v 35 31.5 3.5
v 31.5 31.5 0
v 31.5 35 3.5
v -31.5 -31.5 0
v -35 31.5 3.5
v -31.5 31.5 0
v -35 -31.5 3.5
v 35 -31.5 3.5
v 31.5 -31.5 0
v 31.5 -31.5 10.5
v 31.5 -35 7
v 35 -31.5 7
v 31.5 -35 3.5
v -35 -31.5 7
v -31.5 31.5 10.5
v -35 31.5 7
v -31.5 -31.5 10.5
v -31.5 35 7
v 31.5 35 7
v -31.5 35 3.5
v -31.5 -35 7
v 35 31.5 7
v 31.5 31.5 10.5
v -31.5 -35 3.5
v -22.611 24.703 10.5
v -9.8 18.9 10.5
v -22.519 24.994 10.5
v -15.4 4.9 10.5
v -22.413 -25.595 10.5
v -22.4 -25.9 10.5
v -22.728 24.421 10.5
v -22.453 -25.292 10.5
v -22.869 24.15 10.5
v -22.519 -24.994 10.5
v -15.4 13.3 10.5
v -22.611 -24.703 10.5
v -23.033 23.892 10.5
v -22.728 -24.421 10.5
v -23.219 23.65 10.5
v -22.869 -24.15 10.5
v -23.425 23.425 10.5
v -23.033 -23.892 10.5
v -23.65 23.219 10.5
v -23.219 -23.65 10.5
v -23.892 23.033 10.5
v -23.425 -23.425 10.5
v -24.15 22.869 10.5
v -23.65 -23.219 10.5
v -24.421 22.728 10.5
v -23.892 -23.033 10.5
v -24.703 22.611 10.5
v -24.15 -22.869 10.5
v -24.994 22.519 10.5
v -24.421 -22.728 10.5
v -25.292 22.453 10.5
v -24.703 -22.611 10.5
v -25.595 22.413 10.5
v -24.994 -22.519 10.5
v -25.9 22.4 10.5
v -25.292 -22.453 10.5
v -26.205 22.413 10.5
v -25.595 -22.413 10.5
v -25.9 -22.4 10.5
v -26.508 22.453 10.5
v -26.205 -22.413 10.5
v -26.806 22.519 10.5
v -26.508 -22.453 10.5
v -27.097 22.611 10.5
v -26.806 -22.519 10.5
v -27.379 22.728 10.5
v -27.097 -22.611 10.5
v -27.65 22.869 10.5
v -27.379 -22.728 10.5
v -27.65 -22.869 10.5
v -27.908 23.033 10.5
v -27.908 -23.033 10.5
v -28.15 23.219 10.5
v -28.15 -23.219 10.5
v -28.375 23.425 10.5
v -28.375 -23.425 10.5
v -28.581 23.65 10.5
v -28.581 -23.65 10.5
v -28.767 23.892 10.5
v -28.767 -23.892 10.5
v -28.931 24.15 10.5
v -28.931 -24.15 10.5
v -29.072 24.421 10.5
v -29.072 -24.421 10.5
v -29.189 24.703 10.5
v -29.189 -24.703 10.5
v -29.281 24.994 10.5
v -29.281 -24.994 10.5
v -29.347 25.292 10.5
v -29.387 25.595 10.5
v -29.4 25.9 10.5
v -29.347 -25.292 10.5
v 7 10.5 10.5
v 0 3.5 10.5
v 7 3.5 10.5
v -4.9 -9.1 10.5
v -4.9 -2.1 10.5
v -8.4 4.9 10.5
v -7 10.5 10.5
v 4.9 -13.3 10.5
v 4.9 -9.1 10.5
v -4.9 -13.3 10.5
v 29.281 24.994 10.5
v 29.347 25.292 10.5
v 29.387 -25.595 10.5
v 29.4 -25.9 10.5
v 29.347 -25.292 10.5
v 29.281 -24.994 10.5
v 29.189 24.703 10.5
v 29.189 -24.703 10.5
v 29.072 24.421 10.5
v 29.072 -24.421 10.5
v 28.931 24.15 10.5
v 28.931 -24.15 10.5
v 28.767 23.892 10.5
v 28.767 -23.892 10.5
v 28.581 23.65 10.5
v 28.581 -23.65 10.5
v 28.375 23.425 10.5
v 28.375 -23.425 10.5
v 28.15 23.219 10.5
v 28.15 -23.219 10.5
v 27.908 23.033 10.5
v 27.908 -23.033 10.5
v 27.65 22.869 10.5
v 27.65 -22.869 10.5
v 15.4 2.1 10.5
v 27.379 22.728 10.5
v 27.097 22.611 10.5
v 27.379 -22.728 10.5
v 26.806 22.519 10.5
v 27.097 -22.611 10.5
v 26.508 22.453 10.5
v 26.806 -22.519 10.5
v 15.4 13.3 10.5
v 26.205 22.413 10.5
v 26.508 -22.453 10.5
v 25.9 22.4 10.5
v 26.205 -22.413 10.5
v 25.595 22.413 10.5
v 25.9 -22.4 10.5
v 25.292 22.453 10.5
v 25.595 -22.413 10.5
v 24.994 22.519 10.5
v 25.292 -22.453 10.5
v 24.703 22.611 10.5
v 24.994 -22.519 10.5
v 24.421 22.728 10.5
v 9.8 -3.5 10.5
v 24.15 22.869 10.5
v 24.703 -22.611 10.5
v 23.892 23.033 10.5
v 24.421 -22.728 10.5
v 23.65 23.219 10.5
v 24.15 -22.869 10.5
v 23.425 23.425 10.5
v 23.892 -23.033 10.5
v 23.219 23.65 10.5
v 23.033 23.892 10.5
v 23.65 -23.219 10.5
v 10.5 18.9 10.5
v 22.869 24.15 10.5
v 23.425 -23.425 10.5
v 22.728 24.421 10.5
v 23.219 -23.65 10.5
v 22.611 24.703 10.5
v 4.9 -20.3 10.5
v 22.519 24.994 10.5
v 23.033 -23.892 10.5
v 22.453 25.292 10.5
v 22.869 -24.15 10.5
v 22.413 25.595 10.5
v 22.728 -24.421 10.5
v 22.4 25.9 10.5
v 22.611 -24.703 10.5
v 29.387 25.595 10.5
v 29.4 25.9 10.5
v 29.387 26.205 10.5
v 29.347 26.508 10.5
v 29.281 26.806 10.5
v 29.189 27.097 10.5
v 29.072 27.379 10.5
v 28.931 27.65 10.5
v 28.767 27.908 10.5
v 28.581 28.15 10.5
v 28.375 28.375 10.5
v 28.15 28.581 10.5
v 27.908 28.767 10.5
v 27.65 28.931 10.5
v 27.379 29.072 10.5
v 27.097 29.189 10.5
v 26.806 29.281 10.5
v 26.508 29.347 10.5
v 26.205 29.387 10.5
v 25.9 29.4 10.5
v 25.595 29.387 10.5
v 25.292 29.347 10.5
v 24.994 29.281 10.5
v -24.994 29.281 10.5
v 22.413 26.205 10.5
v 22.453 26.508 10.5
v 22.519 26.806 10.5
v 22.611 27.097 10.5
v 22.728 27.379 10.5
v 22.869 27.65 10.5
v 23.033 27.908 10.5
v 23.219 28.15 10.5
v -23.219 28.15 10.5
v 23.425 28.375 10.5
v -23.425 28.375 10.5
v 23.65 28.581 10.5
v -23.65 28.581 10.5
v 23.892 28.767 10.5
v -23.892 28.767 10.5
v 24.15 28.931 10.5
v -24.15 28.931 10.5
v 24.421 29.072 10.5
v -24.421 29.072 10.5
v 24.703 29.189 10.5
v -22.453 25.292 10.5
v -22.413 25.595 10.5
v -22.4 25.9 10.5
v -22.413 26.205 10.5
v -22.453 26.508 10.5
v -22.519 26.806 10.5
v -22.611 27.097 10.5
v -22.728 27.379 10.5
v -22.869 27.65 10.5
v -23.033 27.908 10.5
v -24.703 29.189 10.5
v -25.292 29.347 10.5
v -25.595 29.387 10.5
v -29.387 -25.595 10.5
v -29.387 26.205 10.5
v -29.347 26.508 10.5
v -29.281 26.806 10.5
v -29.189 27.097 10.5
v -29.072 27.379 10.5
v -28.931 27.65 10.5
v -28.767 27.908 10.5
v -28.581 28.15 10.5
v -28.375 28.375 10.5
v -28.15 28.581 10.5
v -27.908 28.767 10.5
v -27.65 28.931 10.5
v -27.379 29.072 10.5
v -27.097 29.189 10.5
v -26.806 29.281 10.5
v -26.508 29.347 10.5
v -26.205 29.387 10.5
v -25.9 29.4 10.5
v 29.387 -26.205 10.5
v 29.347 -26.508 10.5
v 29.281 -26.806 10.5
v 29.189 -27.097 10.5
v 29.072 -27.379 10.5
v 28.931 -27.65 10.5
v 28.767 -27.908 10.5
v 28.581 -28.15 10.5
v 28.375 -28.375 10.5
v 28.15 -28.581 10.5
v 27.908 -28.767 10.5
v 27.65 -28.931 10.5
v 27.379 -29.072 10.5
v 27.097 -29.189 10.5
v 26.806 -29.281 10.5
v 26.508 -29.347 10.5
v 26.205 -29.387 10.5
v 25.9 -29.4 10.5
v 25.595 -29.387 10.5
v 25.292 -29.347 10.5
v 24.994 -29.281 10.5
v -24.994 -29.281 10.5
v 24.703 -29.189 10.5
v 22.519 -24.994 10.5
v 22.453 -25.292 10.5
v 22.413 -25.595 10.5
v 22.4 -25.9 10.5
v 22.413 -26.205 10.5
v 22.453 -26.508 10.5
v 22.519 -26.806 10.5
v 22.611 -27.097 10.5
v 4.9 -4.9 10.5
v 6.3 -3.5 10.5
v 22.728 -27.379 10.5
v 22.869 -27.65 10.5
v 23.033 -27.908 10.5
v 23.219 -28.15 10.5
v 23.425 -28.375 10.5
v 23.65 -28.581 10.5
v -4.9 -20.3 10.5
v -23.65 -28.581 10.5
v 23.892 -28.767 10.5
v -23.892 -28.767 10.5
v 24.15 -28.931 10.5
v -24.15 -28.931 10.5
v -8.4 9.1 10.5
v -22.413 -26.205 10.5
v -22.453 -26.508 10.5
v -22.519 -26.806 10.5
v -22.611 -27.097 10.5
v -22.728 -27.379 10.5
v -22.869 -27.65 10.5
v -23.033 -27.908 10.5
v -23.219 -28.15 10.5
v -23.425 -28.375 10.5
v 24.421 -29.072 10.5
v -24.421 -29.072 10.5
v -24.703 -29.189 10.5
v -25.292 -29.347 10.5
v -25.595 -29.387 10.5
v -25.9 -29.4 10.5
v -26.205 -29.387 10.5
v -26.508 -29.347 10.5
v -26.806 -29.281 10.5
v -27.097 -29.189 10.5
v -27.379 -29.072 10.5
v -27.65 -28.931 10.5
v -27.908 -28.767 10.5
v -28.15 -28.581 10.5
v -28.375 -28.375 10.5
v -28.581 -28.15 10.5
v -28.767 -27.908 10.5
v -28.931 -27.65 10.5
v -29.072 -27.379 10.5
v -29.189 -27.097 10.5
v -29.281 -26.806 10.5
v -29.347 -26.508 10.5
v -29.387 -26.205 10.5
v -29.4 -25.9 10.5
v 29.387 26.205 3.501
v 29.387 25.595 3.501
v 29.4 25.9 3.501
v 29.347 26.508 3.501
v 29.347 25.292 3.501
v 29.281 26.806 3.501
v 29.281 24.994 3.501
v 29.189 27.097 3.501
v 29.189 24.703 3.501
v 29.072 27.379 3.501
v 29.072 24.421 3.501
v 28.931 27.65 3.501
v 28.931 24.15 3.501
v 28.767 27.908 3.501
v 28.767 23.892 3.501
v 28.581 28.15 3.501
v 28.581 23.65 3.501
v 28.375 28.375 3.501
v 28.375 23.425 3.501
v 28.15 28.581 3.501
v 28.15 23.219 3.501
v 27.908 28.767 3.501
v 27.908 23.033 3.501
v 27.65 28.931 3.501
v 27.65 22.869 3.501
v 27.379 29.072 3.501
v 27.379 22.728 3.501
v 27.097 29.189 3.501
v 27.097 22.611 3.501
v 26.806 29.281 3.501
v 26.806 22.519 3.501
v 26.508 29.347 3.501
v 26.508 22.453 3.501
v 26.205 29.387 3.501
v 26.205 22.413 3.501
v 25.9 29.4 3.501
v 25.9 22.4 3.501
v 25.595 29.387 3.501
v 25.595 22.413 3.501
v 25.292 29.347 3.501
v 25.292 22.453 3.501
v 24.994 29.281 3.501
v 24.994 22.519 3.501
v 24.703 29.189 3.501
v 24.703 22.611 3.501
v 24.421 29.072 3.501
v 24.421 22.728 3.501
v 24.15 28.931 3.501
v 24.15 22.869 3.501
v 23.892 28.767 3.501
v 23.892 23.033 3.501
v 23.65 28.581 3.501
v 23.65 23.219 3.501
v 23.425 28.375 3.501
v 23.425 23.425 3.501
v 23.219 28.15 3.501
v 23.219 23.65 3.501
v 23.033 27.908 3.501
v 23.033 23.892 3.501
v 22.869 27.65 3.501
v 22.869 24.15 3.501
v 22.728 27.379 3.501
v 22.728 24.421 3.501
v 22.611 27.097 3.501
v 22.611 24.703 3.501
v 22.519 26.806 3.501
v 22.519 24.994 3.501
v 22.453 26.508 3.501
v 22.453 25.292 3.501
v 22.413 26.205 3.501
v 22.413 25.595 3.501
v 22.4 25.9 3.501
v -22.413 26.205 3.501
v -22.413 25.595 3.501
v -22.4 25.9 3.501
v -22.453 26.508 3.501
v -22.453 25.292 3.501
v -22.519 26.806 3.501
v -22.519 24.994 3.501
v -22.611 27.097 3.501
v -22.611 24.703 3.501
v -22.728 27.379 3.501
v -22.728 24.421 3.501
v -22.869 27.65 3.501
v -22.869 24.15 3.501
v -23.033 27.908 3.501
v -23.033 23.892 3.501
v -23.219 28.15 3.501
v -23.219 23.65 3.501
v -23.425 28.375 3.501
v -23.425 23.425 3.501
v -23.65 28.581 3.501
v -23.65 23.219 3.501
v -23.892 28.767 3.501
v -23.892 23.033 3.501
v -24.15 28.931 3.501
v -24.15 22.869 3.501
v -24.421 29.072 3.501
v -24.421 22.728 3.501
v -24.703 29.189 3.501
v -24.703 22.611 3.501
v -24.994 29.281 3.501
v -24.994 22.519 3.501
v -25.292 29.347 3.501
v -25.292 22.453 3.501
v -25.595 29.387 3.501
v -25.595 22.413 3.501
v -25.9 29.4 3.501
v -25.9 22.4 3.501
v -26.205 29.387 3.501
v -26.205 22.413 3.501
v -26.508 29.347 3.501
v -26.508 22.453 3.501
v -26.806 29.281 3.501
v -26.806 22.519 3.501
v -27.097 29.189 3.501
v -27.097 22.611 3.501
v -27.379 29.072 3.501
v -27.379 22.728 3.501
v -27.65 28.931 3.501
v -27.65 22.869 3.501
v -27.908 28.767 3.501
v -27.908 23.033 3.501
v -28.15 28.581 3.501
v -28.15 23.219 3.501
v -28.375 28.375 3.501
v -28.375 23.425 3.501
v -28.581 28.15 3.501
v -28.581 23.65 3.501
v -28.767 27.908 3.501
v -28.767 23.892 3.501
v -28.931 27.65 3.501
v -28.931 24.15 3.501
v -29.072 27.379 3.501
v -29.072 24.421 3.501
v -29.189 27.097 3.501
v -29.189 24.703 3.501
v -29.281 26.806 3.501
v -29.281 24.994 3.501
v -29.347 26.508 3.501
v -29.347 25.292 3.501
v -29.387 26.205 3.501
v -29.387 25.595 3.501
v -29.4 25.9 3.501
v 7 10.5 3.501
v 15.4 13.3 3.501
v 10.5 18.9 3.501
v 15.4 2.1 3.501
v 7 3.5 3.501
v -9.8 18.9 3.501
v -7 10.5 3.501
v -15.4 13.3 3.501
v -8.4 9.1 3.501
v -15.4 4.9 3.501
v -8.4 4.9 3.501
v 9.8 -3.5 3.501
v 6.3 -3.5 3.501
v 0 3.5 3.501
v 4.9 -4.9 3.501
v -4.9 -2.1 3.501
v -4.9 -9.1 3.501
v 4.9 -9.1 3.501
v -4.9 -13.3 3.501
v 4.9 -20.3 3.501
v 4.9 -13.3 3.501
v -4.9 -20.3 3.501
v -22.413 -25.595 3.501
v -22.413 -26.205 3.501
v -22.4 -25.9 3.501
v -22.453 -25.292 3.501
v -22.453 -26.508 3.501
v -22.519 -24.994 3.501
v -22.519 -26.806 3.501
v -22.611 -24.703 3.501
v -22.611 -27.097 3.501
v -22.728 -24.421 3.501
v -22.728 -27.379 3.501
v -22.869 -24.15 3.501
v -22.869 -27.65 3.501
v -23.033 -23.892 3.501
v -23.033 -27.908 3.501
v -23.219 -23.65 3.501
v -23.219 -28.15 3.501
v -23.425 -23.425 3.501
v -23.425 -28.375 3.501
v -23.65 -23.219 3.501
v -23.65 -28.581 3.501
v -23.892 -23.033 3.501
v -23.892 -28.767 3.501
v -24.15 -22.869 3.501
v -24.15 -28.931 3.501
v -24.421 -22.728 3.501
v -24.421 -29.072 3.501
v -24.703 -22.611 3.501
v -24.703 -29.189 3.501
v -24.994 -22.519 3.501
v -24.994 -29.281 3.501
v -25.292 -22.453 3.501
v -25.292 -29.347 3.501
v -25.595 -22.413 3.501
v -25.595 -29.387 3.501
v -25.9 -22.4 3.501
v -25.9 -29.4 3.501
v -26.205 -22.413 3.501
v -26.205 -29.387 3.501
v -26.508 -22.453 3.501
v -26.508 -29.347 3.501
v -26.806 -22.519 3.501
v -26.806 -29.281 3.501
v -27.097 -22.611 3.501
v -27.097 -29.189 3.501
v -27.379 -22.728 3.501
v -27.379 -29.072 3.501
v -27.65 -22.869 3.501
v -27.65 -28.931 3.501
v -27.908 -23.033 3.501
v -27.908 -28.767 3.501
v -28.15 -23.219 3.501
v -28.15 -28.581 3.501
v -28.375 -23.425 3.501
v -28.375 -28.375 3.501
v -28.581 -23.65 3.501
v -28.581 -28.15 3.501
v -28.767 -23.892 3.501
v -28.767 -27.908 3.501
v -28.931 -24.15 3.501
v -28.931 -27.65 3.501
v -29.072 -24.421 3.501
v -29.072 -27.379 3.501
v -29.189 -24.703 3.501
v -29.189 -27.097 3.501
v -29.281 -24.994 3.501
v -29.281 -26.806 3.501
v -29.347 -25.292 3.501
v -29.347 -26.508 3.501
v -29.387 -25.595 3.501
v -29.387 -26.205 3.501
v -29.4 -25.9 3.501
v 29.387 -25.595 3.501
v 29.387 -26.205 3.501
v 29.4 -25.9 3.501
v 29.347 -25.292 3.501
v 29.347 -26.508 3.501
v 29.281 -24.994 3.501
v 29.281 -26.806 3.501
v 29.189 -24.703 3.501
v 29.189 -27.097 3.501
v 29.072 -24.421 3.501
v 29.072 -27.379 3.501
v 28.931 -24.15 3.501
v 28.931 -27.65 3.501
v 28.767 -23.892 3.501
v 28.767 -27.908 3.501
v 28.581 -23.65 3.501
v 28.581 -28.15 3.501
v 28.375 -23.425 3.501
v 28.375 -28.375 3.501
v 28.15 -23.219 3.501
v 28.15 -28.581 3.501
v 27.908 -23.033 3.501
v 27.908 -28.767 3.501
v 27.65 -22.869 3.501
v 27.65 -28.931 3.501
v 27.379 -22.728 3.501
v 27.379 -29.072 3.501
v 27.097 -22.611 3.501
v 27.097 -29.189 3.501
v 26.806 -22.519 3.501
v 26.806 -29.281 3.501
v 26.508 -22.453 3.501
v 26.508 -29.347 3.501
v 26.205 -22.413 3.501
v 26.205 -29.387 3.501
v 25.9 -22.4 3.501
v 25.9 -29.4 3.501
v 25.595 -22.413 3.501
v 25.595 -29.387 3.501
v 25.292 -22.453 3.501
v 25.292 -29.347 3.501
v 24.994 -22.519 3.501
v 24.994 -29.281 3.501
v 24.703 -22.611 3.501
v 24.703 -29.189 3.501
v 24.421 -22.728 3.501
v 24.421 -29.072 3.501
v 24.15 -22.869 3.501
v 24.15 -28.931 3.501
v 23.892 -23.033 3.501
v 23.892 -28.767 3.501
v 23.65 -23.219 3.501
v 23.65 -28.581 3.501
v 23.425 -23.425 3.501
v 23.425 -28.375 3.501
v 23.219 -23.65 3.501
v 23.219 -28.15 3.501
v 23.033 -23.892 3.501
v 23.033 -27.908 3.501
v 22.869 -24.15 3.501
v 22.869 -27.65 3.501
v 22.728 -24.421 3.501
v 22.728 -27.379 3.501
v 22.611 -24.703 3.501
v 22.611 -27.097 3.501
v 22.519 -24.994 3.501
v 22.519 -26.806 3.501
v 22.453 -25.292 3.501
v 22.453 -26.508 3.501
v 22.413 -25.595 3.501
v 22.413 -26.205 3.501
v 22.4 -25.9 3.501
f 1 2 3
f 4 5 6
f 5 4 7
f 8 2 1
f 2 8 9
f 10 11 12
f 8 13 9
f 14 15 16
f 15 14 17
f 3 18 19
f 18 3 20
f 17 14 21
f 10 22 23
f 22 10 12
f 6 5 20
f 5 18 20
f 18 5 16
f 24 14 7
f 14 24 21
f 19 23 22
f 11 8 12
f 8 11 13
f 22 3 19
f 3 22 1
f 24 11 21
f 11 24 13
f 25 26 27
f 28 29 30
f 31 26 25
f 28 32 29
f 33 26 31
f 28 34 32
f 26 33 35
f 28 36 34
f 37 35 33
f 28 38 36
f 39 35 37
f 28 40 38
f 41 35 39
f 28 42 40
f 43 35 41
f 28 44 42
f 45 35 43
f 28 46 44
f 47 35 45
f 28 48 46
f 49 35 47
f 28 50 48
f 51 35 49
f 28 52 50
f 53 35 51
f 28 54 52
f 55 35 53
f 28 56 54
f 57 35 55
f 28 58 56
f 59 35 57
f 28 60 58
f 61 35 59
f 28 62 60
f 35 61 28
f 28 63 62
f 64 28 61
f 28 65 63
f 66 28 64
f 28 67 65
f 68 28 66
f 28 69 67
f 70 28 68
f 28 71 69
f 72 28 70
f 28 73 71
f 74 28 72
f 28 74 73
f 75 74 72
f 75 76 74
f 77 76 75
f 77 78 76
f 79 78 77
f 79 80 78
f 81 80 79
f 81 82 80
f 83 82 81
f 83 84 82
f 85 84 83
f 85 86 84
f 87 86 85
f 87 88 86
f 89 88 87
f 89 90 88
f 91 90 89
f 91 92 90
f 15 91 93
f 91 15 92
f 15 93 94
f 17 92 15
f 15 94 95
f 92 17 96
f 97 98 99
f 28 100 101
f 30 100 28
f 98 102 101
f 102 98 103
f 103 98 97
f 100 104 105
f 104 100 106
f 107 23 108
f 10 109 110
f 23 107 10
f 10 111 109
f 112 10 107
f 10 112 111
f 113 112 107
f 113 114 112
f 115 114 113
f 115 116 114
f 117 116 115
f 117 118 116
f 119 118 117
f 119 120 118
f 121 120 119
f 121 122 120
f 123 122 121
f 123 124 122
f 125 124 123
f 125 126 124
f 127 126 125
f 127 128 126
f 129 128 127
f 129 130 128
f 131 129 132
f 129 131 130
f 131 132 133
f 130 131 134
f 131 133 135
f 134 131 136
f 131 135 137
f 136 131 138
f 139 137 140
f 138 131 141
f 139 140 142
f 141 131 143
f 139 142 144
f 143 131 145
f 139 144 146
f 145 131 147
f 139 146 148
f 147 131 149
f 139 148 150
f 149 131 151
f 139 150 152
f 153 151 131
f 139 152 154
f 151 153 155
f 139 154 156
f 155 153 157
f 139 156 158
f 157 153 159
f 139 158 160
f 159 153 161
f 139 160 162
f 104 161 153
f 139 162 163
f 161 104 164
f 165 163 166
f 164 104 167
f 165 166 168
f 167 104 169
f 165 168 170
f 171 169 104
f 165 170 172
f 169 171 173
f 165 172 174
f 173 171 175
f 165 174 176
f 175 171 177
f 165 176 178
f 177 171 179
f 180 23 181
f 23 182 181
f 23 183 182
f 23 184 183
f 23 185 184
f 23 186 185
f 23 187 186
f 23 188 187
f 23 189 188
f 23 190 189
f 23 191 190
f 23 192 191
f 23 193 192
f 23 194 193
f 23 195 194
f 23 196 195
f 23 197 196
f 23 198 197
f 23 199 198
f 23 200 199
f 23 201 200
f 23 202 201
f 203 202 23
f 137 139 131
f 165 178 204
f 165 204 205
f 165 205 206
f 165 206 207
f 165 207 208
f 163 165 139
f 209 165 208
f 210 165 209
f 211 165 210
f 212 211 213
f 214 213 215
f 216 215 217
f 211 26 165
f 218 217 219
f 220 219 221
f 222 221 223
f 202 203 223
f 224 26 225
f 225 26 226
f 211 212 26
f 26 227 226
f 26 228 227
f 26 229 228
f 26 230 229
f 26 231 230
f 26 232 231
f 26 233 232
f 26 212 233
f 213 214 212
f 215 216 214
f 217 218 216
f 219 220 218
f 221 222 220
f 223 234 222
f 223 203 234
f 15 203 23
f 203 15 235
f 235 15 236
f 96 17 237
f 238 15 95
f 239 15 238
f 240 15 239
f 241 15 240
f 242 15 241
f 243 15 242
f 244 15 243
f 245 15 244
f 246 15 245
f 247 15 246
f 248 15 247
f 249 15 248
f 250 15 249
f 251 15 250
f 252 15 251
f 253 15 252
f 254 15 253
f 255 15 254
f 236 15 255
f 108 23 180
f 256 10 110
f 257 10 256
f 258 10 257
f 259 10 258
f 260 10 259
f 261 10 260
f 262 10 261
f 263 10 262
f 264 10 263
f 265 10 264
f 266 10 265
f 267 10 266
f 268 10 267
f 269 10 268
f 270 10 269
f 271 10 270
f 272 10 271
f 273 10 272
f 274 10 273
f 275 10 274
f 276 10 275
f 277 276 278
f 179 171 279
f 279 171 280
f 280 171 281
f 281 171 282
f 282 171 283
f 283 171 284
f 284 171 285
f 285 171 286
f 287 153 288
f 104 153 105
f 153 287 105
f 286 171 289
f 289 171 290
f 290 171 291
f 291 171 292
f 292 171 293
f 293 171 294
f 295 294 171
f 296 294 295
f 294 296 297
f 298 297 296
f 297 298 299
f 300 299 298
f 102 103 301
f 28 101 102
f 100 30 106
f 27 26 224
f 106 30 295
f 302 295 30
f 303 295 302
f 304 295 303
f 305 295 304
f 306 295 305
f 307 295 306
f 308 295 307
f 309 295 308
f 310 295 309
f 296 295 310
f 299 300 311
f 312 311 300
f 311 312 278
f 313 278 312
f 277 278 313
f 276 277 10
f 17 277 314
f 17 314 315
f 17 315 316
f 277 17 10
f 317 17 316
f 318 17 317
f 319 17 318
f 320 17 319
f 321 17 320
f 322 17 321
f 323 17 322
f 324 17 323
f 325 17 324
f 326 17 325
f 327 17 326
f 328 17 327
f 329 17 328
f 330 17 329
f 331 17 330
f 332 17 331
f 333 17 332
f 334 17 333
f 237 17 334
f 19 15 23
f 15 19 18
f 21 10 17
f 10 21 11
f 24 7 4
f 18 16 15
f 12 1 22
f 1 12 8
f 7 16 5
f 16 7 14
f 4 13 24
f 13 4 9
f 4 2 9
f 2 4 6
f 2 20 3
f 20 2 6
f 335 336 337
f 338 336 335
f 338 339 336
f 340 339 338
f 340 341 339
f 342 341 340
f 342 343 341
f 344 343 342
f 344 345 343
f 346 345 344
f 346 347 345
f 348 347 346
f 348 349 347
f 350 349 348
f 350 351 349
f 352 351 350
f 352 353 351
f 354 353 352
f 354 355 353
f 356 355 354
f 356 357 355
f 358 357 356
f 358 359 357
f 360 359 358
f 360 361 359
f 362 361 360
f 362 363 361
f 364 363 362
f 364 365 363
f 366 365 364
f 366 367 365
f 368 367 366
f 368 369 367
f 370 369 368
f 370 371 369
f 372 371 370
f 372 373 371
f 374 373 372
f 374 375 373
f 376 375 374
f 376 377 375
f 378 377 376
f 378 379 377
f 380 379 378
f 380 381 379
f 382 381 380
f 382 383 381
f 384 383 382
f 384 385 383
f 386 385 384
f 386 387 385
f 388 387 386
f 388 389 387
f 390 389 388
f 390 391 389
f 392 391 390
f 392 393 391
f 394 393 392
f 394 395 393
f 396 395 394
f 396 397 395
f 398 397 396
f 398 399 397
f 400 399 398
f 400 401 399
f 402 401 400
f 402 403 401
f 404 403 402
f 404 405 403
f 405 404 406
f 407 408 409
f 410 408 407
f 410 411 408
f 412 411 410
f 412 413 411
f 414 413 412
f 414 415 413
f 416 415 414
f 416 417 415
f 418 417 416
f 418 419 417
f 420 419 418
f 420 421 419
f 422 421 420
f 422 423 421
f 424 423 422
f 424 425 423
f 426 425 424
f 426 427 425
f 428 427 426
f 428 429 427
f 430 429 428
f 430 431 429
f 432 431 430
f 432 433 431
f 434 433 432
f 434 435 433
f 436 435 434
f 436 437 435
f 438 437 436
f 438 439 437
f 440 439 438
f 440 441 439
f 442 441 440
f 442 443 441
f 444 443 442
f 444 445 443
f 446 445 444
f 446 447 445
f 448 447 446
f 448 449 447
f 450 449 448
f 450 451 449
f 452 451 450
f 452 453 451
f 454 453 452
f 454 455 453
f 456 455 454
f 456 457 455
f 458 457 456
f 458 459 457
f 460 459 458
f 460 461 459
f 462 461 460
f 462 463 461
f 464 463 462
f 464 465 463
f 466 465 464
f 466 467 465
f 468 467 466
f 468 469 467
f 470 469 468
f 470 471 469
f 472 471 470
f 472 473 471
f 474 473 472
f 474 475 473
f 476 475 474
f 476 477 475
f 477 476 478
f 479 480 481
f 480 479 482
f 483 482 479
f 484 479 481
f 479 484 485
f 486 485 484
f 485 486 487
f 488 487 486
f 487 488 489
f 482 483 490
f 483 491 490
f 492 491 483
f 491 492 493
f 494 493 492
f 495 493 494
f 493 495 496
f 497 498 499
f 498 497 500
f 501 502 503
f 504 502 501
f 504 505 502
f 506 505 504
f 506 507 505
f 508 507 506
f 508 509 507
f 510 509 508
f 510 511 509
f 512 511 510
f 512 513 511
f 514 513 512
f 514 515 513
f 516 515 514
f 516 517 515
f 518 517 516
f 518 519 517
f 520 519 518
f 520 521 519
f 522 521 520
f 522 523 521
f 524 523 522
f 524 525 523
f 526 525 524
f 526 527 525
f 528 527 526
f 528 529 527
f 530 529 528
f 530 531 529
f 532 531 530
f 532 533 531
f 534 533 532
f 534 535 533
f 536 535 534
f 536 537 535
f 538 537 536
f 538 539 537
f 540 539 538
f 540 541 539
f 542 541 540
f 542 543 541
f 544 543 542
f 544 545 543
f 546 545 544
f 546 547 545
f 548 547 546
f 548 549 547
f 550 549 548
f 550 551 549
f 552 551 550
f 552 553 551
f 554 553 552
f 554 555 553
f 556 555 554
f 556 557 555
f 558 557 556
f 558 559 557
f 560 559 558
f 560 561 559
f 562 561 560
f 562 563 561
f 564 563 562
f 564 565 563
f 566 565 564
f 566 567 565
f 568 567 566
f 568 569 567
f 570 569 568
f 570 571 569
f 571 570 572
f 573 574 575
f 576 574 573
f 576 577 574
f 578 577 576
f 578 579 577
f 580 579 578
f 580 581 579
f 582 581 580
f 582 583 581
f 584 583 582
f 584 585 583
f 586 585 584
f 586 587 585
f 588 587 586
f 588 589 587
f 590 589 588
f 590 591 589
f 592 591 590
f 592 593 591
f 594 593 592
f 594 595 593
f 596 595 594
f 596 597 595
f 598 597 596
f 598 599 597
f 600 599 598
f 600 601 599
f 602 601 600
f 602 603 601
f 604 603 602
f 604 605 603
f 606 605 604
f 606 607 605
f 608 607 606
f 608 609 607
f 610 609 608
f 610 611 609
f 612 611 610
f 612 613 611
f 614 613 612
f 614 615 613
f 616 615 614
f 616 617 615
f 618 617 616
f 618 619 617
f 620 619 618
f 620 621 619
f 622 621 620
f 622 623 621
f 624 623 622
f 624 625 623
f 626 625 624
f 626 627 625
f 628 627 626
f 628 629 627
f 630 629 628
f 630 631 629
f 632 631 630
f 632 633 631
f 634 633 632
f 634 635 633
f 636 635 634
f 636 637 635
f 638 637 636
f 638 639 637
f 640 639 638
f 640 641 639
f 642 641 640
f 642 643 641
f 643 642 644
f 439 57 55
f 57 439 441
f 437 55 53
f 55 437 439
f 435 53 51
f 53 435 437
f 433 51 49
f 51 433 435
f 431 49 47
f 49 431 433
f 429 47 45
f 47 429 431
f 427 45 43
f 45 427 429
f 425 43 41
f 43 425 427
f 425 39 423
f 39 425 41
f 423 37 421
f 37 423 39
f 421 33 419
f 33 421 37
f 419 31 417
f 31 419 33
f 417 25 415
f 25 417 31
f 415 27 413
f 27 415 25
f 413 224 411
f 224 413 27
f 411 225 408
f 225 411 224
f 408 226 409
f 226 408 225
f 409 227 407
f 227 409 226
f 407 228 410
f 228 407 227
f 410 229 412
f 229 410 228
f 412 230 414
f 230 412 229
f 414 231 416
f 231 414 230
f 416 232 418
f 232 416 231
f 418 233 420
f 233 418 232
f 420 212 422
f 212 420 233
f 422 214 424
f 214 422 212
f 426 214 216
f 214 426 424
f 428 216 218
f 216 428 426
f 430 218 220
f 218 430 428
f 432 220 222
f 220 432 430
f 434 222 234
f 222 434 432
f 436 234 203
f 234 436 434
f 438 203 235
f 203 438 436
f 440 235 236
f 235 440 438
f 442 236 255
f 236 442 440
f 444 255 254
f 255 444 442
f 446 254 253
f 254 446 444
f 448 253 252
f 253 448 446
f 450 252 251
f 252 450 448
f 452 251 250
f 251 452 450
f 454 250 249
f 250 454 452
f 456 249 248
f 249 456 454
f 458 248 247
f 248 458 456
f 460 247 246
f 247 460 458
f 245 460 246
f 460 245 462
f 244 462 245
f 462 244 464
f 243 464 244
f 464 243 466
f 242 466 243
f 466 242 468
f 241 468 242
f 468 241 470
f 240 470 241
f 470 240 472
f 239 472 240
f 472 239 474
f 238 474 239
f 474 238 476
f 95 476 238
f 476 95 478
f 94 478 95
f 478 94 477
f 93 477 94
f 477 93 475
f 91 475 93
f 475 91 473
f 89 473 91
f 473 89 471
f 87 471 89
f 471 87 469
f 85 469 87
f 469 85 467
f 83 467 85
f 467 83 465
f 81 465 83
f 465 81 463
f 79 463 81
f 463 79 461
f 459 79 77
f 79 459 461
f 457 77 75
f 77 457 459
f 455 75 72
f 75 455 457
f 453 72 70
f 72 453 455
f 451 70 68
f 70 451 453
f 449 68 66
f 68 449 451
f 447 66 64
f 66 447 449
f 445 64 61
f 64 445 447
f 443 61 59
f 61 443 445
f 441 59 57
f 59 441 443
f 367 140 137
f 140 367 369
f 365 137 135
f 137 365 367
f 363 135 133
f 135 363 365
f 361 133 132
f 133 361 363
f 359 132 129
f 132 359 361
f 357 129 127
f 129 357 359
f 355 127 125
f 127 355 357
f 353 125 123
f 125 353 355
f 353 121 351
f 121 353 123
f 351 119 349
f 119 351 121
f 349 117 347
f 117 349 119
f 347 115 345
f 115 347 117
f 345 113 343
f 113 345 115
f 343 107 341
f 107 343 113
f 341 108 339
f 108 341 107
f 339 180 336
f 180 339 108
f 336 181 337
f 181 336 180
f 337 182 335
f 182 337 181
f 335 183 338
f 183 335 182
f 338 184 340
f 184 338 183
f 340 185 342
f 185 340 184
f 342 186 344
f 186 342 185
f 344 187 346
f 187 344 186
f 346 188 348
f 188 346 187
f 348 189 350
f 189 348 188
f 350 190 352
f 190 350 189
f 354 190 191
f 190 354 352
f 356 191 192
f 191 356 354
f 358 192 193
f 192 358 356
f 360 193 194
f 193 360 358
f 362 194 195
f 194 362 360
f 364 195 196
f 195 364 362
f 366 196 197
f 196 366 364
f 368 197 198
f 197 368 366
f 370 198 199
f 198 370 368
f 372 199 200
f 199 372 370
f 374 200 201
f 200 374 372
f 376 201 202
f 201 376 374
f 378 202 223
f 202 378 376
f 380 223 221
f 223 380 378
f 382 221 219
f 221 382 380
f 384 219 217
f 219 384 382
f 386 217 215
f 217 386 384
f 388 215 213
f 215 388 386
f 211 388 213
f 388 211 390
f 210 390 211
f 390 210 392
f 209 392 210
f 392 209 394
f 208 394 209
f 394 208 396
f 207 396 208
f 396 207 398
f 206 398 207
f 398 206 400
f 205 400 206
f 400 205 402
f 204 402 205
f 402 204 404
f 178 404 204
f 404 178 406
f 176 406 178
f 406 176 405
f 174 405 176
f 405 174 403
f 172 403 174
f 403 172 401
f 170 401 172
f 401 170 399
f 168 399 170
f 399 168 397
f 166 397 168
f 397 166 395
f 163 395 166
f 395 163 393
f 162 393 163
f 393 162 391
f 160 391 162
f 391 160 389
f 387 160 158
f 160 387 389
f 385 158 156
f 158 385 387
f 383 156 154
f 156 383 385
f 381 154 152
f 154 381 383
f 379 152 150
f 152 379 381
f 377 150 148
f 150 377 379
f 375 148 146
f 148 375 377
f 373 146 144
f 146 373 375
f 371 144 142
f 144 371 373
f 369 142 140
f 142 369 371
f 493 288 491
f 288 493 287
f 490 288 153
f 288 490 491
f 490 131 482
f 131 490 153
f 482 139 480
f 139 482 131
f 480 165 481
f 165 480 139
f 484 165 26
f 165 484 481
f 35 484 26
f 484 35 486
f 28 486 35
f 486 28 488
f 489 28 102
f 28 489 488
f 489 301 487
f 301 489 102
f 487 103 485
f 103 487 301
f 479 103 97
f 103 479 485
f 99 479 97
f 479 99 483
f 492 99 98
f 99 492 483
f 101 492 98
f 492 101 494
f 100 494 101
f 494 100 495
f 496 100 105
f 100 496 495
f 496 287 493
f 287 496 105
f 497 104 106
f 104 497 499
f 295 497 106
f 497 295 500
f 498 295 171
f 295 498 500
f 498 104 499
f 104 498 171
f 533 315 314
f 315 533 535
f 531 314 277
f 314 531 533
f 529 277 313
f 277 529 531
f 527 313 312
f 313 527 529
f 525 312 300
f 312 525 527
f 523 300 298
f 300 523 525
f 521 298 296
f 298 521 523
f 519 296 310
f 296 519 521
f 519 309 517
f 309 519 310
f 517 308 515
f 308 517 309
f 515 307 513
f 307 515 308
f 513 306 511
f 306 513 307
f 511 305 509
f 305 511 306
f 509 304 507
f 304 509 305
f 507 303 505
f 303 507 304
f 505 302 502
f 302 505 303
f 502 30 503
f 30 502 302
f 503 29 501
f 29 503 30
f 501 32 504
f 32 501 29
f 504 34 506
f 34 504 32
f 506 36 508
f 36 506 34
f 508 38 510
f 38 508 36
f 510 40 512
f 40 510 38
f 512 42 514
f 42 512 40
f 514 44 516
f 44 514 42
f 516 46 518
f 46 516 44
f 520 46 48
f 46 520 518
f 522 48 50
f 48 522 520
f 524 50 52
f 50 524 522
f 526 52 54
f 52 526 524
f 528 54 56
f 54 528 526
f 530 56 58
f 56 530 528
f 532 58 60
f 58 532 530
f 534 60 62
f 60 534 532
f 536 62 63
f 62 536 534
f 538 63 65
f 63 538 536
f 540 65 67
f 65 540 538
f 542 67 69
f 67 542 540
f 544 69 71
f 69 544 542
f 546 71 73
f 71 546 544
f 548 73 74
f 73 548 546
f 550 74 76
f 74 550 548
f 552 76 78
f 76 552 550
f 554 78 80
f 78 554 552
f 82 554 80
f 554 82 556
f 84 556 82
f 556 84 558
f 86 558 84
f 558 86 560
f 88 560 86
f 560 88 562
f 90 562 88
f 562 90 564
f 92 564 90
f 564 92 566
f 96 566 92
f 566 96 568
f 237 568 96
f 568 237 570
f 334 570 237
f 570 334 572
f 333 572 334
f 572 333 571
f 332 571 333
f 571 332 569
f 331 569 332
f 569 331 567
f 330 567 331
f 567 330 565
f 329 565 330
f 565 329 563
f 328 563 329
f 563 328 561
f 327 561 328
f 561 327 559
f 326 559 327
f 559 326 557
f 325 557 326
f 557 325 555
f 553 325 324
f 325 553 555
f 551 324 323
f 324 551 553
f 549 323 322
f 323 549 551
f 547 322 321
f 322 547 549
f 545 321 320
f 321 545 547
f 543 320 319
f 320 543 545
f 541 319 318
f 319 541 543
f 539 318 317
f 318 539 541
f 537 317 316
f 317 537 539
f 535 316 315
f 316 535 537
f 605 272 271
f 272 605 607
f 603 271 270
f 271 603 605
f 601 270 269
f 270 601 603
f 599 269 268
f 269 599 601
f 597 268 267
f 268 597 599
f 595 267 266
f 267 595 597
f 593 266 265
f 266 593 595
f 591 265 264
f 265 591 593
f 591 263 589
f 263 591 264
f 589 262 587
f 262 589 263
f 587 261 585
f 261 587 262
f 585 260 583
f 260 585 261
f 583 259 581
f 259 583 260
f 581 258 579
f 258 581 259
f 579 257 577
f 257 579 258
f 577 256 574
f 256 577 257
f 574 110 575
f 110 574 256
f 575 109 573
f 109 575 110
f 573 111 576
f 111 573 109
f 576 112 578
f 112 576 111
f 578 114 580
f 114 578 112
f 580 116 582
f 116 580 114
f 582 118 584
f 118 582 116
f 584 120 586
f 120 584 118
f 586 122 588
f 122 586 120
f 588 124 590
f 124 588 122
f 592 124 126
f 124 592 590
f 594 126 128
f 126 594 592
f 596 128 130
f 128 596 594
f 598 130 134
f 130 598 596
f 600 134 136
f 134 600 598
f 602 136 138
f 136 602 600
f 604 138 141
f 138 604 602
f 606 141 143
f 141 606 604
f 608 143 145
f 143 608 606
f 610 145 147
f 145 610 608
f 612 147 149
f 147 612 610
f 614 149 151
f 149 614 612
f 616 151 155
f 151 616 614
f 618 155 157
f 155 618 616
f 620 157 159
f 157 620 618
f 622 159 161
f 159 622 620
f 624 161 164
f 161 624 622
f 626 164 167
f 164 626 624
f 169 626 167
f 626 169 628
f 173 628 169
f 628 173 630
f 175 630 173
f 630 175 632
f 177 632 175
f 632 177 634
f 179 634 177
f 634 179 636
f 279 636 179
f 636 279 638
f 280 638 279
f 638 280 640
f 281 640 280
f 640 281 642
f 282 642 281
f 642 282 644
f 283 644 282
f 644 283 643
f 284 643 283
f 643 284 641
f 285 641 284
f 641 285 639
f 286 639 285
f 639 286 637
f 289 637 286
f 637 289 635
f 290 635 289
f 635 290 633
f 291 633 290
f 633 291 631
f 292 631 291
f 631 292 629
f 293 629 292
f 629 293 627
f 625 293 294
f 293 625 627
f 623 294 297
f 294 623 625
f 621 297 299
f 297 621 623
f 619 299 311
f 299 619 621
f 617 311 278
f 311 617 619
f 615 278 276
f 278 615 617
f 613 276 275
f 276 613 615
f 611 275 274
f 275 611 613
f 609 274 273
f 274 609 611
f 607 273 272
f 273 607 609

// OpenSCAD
// file: common.scad
// Unless otherwise specified, each resulting shape is
// resting on the XY plane, centered on the Z axis.

// A small amount to make sure shapes overlap when needed. This
// is well below the resolution of my 3D printer, so it
// shouldn't affect the final result.
eps = 0.001;

// High quality for printing.
$fa = 5;
$fs = 0.4;

module repeatx(n, spacing) {
  for (i = [1:n])
    translate([(i-1)*spacing, 0, 0])
      children();
}

module repeaty(n, spacing) {
  for (i = [1:n])
    translate([0, (i-1)*spacing, 0])
      children();
}

// A square pyramid, 1mm wide and 0.5mm tall. Each side of
// the base is centered on an axis.
module pyramid() {
  linear_extrude(0.5, scale=0)
    square(1, center=true);
}

// A regular octahedron centered on the origin with its
// vertices on the axes. 'axis' gives its full length along
// each axis.
module octahedron(axis) {
  // Top and bottom halves.
  for (a = [-1, 1])
    scale([1, 1, a])
      // Extrude a square into a pyramid.
      linear_extrude(axis/2, scale=0)
        rotate([0, 0, 45])
          square(norm([axis/2, axis/2]), center=true);
}

// 'd' is the outer dimensions of the box.
module chamfered_box(d, chamfer=0.5) {
  assert(d.x >= chamfer*2);
  assert(d.y >= chamfer*2);
  assert(d.z >= chamfer*2);

  // Raise the result up so it is resting on the XY plane.
  translate([0, 0, d.z/2]) {
    minkowski() {
      // The desired cube, scaled back by the chamfer distance
      // in all directions.
      cube(d - [chamfer*2, chamfer*2, chamfer*2], center=true);
      octahedron(chamfer*2);
    }
  }
}

module chamfered_disk(height, radius) {
  // Chamfer base disks and chips more aggressively.
  chamfer = 1.1;
  assert(radius >= chamfer);
  assert(height >= chamfer*2);

  // Raise the result up so it is resting on the XY plane.
  translate([0, 0, height/2]) {
    minkowski() {
      // The desired disk, scaled back by the chamfer distance
      // in all directions.
      cylinder(height-chamfer*2, r=radius-chamfer, center=true);
      
      // A pair of cones.
      for (a = [-1, 1])
        scale([1, 1, a])
          linear_extrude(chamfer, scale=0)
            circle(chamfer);
    }
  }
}

locking_lug_dims = [2.3, 2.3, 1.8+2*eps];

// A snug fit for gluing.
module locking_lug() {
  // Taper the lug slightly, to counteract the printing effect
  // which spreads the top layer slightly.
  linear_extrude(locking_lug_dims.z, scale=0.95)
    square([locking_lug_dims.x, locking_lug_dims.y],
            center=true);
}

// Make extra sure the lug will fit all the way into the hole.
locking_socket_extra_depth = 0.7;

module locking_socket_top() {
  extra_depth = 0.15;
  translate([
    0, 0,
    -(
       locking_lug_dims.z+locking_socket_extra_depth+extra_depth
    )/2+eps
  ]) {
    cube(locking_lug_dims + [
      0.15, 0.15,
      locking_socket_extra_depth+extra_depth
    ], center=true);
  }
}

module locking_socket_bottom() {
  translate([
    0, 0,
    (locking_lug_dims.z+locking_socket_extra_depth)/2-eps
  ]) {
    cube(locking_lug_dims + [
      // When printing this on the bottom of a model, it
      // needs to be a bit wider to account for
      // elephant-foot.
      0.3, 0.3,
      locking_socket_extra_depth
    ], center=true);
  }
}

// A pin which can be used to join two locking sockets.
module locking_pin() {
  dims = [
    locking_lug_dims.x-0.2,
    // Lay the pin on its side for more reliable printing.
    locking_lug_dims.z*2 + locking_socket_extra_depth/2,
    locking_lug_dims.y-0.2,
  ];
  translate([0, 0, dims.z/2]) {
    difference() {
      cube(dims, center=true);
      
      // A slight bottom chamfer to combat elephant-foot.
      for (a = [-1, 1])
        scale([a, 1, 1])
          translate([dims.x/2, -eps, -dims.z/2-1.3])
            rotate([0, 45, 0])
              cube([dims.x, dims.y+3*eps, dims.z], center=true);
    }
  }
}

// Arranges children in square pattern.
module arrange(spacing) {
  s = ceil(sqrt($children));
  for (a = [0:s-1], b = [0:s-1]) {
    c = a + b*s;
    x = a - s/2 + 0.5;
    y = b - s/2 + 0.5;
    if (c < $children)
      translate([x*spacing, y*spacing, 0])
        children(c);
  }
}
// main file
include <common.scad>

side = 100;
engrave = 10;

module question_mark() {
  translate([0, -3, 0]) {
    polygon([
      [-7, -10],
      [-7, 0],
      [0, 8],
      [10, 8],
      [10, 18],
      [-10, 18],
      [-12, 16],
      [-12, 10],
      [-22, 10],
      [-22, 22],
      [-14, 30],
      [15, 30],
      [22, 22],
      [22, 6],
      [14, -2],
      [9, -2],
      [7, -4],
      [7, -10],
    ]);
    polygon([
      [-7, -26],
      [-7, -16],
      [7, -16],
      [7, -26],
    ]);
  }

  // Studs around question mark.
  for (a = [-1, 1], b = [-1, 1])
    scale([a, b, 1])
      translate([37, 37, 0])
        circle(5);
}

module big_j() {
  offset(0.2)
    text("J", 70, "Bookman");
}

scale(0.7 * [1, 1, 1]) {
  difference() {
    chamfered_box([side, side, 15], chamfer=5);

    // Question mark.
    translate([0, 0, 5+eps])
      linear_extrude(engrave)
        question_mark();
  }
}
